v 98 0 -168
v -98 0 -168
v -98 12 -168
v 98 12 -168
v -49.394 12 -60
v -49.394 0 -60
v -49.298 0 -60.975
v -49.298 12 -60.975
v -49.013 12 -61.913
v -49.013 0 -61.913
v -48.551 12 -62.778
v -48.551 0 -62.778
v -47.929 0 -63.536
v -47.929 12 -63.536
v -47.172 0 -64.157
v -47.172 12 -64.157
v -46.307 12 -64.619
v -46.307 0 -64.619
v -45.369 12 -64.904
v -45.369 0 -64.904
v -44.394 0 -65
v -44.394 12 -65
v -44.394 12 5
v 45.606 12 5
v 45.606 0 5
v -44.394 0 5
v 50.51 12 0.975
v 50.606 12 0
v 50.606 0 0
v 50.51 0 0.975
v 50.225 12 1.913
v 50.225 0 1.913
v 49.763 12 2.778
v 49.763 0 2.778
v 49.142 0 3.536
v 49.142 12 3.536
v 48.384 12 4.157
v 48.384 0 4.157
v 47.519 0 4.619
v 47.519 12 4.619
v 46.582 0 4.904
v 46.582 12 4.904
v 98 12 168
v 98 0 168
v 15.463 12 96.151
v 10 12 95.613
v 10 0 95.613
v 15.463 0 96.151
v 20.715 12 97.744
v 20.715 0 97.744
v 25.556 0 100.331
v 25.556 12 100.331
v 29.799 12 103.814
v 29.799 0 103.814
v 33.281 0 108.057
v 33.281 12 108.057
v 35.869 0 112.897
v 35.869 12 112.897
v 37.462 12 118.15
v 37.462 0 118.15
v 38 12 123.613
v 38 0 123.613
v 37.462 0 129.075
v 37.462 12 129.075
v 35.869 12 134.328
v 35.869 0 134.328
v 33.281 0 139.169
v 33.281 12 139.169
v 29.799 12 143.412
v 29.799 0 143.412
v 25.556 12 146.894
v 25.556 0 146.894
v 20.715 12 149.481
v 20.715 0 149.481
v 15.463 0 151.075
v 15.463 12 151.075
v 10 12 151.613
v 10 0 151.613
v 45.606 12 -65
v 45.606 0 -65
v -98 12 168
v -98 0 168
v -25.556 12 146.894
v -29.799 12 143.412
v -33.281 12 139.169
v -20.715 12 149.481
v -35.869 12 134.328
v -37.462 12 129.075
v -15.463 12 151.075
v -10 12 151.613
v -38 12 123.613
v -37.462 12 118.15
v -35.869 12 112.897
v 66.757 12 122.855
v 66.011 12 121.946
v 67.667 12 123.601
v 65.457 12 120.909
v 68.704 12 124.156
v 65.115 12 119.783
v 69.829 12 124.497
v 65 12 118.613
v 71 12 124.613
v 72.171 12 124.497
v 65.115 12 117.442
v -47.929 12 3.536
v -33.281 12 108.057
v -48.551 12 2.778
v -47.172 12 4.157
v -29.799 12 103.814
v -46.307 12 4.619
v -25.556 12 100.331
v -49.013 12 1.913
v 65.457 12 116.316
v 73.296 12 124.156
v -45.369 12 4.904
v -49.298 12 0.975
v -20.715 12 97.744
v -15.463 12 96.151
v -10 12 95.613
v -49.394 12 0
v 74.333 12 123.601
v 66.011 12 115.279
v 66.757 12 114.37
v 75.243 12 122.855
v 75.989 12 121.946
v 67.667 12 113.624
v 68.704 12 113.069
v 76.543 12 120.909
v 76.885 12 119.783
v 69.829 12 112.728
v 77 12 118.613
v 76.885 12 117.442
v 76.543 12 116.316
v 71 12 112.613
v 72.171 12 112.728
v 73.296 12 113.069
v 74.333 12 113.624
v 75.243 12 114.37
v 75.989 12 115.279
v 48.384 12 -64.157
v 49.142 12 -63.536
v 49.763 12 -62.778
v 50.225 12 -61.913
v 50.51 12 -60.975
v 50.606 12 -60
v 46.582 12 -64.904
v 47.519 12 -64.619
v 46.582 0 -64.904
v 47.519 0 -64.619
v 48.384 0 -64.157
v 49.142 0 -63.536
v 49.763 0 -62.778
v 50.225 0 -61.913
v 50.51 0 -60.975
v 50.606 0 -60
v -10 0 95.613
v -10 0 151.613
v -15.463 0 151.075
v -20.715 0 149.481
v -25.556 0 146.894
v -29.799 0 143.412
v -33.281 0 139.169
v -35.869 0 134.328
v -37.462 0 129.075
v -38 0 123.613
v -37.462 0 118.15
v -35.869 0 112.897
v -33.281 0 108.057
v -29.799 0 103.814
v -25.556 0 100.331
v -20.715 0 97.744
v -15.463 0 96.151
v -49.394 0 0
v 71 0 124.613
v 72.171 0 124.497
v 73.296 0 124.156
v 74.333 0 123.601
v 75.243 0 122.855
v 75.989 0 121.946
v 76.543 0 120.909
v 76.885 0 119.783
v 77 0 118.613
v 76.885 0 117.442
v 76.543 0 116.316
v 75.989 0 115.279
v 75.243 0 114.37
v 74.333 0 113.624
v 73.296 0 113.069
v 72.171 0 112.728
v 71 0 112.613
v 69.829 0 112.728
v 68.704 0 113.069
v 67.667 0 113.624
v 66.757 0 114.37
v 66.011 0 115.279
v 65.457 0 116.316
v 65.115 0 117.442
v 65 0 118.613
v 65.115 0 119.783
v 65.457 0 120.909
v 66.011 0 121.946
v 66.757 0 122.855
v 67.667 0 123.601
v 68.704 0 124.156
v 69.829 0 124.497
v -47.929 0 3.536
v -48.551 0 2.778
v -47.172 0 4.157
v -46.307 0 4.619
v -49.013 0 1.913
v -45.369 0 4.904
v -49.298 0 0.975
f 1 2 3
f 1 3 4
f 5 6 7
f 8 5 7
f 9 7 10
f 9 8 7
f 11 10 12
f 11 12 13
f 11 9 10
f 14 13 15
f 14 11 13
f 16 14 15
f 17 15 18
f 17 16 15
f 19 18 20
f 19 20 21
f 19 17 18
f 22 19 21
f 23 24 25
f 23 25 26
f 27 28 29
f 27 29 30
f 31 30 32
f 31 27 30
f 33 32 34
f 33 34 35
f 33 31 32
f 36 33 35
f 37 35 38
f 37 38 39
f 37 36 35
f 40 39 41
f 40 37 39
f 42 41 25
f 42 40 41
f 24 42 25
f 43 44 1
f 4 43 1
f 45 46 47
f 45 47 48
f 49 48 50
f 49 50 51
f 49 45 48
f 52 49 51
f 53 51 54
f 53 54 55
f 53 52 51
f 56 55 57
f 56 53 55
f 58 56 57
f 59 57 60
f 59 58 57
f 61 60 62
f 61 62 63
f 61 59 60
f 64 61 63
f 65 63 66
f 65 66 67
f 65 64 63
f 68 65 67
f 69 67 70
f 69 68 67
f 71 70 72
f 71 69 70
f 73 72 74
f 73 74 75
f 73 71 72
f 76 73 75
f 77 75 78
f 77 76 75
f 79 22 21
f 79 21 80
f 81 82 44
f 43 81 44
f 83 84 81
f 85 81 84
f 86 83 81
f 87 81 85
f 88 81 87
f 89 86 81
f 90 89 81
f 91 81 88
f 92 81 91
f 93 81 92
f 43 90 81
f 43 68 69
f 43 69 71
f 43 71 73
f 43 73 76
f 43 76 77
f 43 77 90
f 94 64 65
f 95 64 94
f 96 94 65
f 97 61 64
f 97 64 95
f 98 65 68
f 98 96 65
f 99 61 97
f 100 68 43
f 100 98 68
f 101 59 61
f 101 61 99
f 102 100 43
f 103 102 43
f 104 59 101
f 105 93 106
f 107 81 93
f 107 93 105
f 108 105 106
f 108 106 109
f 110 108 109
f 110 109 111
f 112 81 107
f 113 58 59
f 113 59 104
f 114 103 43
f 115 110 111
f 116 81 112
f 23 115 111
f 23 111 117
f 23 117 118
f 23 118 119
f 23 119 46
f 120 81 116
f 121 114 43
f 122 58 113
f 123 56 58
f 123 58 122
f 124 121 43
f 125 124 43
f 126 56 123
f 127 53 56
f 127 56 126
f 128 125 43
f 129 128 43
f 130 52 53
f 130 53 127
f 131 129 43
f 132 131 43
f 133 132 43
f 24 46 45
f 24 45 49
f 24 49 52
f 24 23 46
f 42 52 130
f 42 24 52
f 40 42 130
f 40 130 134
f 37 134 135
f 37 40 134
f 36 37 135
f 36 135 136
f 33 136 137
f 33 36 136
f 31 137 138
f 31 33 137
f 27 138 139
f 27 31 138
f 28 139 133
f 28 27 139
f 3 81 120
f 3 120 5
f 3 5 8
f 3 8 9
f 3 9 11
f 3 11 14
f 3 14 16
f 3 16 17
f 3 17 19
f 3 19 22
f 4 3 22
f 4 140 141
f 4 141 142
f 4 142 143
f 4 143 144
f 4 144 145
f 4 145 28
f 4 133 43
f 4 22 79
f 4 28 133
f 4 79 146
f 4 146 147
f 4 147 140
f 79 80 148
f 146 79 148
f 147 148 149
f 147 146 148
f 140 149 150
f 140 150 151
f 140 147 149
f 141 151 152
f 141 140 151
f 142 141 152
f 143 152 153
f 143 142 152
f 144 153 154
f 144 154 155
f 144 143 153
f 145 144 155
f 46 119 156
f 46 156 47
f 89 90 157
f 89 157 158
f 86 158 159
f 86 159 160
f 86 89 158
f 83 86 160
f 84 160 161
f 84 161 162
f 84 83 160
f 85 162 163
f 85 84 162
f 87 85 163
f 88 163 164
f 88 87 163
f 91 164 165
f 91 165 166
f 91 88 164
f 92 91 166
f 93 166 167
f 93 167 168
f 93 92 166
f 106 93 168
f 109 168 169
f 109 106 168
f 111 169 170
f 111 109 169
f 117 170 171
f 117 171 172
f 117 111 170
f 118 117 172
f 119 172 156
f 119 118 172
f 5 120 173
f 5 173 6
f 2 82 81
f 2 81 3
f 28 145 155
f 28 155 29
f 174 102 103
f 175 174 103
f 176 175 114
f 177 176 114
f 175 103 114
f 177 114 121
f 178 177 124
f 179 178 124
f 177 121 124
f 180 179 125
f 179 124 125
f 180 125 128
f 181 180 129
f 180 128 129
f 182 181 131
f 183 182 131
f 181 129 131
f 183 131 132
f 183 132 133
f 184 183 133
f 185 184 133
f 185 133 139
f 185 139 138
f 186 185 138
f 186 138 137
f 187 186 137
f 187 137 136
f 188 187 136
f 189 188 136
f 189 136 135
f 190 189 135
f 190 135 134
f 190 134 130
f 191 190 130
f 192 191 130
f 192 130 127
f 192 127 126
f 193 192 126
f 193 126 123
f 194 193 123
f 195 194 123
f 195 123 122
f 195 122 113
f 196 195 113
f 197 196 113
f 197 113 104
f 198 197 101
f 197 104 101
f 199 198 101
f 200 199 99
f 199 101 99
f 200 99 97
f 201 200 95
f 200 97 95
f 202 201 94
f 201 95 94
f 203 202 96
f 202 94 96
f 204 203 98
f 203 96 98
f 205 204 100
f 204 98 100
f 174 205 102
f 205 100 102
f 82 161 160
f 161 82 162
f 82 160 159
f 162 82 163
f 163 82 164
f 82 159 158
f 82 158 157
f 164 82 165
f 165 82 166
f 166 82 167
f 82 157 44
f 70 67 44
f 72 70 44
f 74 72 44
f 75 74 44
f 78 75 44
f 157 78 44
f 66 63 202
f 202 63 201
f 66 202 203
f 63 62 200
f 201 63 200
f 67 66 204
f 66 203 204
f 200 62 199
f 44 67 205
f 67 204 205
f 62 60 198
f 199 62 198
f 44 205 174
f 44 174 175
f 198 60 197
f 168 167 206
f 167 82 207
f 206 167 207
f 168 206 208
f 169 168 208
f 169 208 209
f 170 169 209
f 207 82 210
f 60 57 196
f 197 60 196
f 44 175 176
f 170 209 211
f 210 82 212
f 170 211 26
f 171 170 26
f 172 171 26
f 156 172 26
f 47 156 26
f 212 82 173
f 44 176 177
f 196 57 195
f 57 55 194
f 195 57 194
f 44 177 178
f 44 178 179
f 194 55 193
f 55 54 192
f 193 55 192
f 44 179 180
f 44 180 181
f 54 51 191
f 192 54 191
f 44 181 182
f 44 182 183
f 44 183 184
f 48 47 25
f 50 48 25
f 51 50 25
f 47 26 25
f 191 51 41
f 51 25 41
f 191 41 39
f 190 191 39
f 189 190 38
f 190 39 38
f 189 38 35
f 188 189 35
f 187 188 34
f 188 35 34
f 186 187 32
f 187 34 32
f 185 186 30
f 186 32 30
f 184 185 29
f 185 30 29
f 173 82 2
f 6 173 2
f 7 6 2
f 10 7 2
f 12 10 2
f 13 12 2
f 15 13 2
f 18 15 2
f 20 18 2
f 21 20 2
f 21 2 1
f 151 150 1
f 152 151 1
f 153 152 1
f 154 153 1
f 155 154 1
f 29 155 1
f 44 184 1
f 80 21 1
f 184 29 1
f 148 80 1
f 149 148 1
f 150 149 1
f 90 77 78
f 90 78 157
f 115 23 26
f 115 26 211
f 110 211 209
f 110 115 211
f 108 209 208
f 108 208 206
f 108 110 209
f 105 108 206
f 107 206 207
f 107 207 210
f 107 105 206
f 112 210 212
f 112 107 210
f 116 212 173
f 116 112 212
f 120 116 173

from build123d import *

# Parameters (mm, degrees)
SKETCH1_W           = 196
SKETCH1_H           = 336
BOSS_EXTRUDE2_DEPTH = 12
CUT_EXTRUDE1_DEPTH  = 12
CUT_EXTRUDE2_DEPTH  = 12
SKETCH7_R           = 6
CUT_EXTRUDE3_DEPTH  = 73


with BuildPart() as part:
    # Sketch1 → Boss-Extrude2 (new body)
    with BuildSketch(Plane(origin=(0, 0, 0), x_dir=(1, 0, 0), z_dir=(0, 1, 0))):
        Rectangle(SKETCH1_W, SKETCH1_H)
    extrude(amount=BOSS_EXTRUDE2_DEPTH)

    # Sketch5 → Cut-Extrude1 (cut)
    with BuildSketch(Plane(origin=(0, 12, 0), x_dir=(1, 0, 0), z_dir=(0, 1, 0))):
        with BuildLine():
            Line((10, -151.612579221), (-10, -151.612579221))
            ThreePointArc((-10, -151.612579221), (-38, -123.612579221), (-10, -95.612579221))
            Line((-10, -95.612579221), (10, -95.612579221))
            ThreePointArc((10, -95.612579221), (38, -123.612579221), (10, -151.612579221))
        make_face()
    extrude(amount=-CUT_EXTRUDE1_DEPTH, mode=Mode.SUBTRACT)

    # Sketch6 → Cut-Extrude2 (cut)
    with BuildSketch(Plane(origin=(0, 12, 0), x_dir=(1, 0, 0), z_dir=(0, 1, 0))):
        with BuildLine():
            Line((45.606081406, -5), (-44.393918594, -5))
            ThreePointArc((-44.393918594, -5), (-47.9294525, -3.535533906), (-49.393918594, 0))
            Line((-49.393918594, 0), (-49.393918594, 60))
            ThreePointArc((-49.393918594, 60), (-47.9294525, 63.535533906), (-44.393918594, 65))
            Line((-44.393918594, 65), (45.606081406, 65))
            ThreePointArc((45.606081406, 65), (49.141615312, 63.535533906), (50.606081406, 60))
            Line((50.606081406, 60), (50.606081406, 0))
            ThreePointArc((50.606081406, 0), (49.141615312, -3.535533906), (45.606081406, -5))
        make_face()
    extrude(amount=-CUT_EXTRUDE2_DEPTH, mode=Mode.SUBTRACT)

    # Sketch7 → Cut-Extrude3 (cut)
    with BuildSketch(Plane(origin=(0, 12, 0), x_dir=(1, 0, 0), z_dir=(0, 1, 0))):
        with Locations(Location((71, -118.612579221, 0), (0, 0, 270))):
            Circle(SKETCH7_R)
    extrude(amount=-CUT_EXTRUDE3_DEPTH, mode=Mode.SUBTRACT)


solid = part.part
